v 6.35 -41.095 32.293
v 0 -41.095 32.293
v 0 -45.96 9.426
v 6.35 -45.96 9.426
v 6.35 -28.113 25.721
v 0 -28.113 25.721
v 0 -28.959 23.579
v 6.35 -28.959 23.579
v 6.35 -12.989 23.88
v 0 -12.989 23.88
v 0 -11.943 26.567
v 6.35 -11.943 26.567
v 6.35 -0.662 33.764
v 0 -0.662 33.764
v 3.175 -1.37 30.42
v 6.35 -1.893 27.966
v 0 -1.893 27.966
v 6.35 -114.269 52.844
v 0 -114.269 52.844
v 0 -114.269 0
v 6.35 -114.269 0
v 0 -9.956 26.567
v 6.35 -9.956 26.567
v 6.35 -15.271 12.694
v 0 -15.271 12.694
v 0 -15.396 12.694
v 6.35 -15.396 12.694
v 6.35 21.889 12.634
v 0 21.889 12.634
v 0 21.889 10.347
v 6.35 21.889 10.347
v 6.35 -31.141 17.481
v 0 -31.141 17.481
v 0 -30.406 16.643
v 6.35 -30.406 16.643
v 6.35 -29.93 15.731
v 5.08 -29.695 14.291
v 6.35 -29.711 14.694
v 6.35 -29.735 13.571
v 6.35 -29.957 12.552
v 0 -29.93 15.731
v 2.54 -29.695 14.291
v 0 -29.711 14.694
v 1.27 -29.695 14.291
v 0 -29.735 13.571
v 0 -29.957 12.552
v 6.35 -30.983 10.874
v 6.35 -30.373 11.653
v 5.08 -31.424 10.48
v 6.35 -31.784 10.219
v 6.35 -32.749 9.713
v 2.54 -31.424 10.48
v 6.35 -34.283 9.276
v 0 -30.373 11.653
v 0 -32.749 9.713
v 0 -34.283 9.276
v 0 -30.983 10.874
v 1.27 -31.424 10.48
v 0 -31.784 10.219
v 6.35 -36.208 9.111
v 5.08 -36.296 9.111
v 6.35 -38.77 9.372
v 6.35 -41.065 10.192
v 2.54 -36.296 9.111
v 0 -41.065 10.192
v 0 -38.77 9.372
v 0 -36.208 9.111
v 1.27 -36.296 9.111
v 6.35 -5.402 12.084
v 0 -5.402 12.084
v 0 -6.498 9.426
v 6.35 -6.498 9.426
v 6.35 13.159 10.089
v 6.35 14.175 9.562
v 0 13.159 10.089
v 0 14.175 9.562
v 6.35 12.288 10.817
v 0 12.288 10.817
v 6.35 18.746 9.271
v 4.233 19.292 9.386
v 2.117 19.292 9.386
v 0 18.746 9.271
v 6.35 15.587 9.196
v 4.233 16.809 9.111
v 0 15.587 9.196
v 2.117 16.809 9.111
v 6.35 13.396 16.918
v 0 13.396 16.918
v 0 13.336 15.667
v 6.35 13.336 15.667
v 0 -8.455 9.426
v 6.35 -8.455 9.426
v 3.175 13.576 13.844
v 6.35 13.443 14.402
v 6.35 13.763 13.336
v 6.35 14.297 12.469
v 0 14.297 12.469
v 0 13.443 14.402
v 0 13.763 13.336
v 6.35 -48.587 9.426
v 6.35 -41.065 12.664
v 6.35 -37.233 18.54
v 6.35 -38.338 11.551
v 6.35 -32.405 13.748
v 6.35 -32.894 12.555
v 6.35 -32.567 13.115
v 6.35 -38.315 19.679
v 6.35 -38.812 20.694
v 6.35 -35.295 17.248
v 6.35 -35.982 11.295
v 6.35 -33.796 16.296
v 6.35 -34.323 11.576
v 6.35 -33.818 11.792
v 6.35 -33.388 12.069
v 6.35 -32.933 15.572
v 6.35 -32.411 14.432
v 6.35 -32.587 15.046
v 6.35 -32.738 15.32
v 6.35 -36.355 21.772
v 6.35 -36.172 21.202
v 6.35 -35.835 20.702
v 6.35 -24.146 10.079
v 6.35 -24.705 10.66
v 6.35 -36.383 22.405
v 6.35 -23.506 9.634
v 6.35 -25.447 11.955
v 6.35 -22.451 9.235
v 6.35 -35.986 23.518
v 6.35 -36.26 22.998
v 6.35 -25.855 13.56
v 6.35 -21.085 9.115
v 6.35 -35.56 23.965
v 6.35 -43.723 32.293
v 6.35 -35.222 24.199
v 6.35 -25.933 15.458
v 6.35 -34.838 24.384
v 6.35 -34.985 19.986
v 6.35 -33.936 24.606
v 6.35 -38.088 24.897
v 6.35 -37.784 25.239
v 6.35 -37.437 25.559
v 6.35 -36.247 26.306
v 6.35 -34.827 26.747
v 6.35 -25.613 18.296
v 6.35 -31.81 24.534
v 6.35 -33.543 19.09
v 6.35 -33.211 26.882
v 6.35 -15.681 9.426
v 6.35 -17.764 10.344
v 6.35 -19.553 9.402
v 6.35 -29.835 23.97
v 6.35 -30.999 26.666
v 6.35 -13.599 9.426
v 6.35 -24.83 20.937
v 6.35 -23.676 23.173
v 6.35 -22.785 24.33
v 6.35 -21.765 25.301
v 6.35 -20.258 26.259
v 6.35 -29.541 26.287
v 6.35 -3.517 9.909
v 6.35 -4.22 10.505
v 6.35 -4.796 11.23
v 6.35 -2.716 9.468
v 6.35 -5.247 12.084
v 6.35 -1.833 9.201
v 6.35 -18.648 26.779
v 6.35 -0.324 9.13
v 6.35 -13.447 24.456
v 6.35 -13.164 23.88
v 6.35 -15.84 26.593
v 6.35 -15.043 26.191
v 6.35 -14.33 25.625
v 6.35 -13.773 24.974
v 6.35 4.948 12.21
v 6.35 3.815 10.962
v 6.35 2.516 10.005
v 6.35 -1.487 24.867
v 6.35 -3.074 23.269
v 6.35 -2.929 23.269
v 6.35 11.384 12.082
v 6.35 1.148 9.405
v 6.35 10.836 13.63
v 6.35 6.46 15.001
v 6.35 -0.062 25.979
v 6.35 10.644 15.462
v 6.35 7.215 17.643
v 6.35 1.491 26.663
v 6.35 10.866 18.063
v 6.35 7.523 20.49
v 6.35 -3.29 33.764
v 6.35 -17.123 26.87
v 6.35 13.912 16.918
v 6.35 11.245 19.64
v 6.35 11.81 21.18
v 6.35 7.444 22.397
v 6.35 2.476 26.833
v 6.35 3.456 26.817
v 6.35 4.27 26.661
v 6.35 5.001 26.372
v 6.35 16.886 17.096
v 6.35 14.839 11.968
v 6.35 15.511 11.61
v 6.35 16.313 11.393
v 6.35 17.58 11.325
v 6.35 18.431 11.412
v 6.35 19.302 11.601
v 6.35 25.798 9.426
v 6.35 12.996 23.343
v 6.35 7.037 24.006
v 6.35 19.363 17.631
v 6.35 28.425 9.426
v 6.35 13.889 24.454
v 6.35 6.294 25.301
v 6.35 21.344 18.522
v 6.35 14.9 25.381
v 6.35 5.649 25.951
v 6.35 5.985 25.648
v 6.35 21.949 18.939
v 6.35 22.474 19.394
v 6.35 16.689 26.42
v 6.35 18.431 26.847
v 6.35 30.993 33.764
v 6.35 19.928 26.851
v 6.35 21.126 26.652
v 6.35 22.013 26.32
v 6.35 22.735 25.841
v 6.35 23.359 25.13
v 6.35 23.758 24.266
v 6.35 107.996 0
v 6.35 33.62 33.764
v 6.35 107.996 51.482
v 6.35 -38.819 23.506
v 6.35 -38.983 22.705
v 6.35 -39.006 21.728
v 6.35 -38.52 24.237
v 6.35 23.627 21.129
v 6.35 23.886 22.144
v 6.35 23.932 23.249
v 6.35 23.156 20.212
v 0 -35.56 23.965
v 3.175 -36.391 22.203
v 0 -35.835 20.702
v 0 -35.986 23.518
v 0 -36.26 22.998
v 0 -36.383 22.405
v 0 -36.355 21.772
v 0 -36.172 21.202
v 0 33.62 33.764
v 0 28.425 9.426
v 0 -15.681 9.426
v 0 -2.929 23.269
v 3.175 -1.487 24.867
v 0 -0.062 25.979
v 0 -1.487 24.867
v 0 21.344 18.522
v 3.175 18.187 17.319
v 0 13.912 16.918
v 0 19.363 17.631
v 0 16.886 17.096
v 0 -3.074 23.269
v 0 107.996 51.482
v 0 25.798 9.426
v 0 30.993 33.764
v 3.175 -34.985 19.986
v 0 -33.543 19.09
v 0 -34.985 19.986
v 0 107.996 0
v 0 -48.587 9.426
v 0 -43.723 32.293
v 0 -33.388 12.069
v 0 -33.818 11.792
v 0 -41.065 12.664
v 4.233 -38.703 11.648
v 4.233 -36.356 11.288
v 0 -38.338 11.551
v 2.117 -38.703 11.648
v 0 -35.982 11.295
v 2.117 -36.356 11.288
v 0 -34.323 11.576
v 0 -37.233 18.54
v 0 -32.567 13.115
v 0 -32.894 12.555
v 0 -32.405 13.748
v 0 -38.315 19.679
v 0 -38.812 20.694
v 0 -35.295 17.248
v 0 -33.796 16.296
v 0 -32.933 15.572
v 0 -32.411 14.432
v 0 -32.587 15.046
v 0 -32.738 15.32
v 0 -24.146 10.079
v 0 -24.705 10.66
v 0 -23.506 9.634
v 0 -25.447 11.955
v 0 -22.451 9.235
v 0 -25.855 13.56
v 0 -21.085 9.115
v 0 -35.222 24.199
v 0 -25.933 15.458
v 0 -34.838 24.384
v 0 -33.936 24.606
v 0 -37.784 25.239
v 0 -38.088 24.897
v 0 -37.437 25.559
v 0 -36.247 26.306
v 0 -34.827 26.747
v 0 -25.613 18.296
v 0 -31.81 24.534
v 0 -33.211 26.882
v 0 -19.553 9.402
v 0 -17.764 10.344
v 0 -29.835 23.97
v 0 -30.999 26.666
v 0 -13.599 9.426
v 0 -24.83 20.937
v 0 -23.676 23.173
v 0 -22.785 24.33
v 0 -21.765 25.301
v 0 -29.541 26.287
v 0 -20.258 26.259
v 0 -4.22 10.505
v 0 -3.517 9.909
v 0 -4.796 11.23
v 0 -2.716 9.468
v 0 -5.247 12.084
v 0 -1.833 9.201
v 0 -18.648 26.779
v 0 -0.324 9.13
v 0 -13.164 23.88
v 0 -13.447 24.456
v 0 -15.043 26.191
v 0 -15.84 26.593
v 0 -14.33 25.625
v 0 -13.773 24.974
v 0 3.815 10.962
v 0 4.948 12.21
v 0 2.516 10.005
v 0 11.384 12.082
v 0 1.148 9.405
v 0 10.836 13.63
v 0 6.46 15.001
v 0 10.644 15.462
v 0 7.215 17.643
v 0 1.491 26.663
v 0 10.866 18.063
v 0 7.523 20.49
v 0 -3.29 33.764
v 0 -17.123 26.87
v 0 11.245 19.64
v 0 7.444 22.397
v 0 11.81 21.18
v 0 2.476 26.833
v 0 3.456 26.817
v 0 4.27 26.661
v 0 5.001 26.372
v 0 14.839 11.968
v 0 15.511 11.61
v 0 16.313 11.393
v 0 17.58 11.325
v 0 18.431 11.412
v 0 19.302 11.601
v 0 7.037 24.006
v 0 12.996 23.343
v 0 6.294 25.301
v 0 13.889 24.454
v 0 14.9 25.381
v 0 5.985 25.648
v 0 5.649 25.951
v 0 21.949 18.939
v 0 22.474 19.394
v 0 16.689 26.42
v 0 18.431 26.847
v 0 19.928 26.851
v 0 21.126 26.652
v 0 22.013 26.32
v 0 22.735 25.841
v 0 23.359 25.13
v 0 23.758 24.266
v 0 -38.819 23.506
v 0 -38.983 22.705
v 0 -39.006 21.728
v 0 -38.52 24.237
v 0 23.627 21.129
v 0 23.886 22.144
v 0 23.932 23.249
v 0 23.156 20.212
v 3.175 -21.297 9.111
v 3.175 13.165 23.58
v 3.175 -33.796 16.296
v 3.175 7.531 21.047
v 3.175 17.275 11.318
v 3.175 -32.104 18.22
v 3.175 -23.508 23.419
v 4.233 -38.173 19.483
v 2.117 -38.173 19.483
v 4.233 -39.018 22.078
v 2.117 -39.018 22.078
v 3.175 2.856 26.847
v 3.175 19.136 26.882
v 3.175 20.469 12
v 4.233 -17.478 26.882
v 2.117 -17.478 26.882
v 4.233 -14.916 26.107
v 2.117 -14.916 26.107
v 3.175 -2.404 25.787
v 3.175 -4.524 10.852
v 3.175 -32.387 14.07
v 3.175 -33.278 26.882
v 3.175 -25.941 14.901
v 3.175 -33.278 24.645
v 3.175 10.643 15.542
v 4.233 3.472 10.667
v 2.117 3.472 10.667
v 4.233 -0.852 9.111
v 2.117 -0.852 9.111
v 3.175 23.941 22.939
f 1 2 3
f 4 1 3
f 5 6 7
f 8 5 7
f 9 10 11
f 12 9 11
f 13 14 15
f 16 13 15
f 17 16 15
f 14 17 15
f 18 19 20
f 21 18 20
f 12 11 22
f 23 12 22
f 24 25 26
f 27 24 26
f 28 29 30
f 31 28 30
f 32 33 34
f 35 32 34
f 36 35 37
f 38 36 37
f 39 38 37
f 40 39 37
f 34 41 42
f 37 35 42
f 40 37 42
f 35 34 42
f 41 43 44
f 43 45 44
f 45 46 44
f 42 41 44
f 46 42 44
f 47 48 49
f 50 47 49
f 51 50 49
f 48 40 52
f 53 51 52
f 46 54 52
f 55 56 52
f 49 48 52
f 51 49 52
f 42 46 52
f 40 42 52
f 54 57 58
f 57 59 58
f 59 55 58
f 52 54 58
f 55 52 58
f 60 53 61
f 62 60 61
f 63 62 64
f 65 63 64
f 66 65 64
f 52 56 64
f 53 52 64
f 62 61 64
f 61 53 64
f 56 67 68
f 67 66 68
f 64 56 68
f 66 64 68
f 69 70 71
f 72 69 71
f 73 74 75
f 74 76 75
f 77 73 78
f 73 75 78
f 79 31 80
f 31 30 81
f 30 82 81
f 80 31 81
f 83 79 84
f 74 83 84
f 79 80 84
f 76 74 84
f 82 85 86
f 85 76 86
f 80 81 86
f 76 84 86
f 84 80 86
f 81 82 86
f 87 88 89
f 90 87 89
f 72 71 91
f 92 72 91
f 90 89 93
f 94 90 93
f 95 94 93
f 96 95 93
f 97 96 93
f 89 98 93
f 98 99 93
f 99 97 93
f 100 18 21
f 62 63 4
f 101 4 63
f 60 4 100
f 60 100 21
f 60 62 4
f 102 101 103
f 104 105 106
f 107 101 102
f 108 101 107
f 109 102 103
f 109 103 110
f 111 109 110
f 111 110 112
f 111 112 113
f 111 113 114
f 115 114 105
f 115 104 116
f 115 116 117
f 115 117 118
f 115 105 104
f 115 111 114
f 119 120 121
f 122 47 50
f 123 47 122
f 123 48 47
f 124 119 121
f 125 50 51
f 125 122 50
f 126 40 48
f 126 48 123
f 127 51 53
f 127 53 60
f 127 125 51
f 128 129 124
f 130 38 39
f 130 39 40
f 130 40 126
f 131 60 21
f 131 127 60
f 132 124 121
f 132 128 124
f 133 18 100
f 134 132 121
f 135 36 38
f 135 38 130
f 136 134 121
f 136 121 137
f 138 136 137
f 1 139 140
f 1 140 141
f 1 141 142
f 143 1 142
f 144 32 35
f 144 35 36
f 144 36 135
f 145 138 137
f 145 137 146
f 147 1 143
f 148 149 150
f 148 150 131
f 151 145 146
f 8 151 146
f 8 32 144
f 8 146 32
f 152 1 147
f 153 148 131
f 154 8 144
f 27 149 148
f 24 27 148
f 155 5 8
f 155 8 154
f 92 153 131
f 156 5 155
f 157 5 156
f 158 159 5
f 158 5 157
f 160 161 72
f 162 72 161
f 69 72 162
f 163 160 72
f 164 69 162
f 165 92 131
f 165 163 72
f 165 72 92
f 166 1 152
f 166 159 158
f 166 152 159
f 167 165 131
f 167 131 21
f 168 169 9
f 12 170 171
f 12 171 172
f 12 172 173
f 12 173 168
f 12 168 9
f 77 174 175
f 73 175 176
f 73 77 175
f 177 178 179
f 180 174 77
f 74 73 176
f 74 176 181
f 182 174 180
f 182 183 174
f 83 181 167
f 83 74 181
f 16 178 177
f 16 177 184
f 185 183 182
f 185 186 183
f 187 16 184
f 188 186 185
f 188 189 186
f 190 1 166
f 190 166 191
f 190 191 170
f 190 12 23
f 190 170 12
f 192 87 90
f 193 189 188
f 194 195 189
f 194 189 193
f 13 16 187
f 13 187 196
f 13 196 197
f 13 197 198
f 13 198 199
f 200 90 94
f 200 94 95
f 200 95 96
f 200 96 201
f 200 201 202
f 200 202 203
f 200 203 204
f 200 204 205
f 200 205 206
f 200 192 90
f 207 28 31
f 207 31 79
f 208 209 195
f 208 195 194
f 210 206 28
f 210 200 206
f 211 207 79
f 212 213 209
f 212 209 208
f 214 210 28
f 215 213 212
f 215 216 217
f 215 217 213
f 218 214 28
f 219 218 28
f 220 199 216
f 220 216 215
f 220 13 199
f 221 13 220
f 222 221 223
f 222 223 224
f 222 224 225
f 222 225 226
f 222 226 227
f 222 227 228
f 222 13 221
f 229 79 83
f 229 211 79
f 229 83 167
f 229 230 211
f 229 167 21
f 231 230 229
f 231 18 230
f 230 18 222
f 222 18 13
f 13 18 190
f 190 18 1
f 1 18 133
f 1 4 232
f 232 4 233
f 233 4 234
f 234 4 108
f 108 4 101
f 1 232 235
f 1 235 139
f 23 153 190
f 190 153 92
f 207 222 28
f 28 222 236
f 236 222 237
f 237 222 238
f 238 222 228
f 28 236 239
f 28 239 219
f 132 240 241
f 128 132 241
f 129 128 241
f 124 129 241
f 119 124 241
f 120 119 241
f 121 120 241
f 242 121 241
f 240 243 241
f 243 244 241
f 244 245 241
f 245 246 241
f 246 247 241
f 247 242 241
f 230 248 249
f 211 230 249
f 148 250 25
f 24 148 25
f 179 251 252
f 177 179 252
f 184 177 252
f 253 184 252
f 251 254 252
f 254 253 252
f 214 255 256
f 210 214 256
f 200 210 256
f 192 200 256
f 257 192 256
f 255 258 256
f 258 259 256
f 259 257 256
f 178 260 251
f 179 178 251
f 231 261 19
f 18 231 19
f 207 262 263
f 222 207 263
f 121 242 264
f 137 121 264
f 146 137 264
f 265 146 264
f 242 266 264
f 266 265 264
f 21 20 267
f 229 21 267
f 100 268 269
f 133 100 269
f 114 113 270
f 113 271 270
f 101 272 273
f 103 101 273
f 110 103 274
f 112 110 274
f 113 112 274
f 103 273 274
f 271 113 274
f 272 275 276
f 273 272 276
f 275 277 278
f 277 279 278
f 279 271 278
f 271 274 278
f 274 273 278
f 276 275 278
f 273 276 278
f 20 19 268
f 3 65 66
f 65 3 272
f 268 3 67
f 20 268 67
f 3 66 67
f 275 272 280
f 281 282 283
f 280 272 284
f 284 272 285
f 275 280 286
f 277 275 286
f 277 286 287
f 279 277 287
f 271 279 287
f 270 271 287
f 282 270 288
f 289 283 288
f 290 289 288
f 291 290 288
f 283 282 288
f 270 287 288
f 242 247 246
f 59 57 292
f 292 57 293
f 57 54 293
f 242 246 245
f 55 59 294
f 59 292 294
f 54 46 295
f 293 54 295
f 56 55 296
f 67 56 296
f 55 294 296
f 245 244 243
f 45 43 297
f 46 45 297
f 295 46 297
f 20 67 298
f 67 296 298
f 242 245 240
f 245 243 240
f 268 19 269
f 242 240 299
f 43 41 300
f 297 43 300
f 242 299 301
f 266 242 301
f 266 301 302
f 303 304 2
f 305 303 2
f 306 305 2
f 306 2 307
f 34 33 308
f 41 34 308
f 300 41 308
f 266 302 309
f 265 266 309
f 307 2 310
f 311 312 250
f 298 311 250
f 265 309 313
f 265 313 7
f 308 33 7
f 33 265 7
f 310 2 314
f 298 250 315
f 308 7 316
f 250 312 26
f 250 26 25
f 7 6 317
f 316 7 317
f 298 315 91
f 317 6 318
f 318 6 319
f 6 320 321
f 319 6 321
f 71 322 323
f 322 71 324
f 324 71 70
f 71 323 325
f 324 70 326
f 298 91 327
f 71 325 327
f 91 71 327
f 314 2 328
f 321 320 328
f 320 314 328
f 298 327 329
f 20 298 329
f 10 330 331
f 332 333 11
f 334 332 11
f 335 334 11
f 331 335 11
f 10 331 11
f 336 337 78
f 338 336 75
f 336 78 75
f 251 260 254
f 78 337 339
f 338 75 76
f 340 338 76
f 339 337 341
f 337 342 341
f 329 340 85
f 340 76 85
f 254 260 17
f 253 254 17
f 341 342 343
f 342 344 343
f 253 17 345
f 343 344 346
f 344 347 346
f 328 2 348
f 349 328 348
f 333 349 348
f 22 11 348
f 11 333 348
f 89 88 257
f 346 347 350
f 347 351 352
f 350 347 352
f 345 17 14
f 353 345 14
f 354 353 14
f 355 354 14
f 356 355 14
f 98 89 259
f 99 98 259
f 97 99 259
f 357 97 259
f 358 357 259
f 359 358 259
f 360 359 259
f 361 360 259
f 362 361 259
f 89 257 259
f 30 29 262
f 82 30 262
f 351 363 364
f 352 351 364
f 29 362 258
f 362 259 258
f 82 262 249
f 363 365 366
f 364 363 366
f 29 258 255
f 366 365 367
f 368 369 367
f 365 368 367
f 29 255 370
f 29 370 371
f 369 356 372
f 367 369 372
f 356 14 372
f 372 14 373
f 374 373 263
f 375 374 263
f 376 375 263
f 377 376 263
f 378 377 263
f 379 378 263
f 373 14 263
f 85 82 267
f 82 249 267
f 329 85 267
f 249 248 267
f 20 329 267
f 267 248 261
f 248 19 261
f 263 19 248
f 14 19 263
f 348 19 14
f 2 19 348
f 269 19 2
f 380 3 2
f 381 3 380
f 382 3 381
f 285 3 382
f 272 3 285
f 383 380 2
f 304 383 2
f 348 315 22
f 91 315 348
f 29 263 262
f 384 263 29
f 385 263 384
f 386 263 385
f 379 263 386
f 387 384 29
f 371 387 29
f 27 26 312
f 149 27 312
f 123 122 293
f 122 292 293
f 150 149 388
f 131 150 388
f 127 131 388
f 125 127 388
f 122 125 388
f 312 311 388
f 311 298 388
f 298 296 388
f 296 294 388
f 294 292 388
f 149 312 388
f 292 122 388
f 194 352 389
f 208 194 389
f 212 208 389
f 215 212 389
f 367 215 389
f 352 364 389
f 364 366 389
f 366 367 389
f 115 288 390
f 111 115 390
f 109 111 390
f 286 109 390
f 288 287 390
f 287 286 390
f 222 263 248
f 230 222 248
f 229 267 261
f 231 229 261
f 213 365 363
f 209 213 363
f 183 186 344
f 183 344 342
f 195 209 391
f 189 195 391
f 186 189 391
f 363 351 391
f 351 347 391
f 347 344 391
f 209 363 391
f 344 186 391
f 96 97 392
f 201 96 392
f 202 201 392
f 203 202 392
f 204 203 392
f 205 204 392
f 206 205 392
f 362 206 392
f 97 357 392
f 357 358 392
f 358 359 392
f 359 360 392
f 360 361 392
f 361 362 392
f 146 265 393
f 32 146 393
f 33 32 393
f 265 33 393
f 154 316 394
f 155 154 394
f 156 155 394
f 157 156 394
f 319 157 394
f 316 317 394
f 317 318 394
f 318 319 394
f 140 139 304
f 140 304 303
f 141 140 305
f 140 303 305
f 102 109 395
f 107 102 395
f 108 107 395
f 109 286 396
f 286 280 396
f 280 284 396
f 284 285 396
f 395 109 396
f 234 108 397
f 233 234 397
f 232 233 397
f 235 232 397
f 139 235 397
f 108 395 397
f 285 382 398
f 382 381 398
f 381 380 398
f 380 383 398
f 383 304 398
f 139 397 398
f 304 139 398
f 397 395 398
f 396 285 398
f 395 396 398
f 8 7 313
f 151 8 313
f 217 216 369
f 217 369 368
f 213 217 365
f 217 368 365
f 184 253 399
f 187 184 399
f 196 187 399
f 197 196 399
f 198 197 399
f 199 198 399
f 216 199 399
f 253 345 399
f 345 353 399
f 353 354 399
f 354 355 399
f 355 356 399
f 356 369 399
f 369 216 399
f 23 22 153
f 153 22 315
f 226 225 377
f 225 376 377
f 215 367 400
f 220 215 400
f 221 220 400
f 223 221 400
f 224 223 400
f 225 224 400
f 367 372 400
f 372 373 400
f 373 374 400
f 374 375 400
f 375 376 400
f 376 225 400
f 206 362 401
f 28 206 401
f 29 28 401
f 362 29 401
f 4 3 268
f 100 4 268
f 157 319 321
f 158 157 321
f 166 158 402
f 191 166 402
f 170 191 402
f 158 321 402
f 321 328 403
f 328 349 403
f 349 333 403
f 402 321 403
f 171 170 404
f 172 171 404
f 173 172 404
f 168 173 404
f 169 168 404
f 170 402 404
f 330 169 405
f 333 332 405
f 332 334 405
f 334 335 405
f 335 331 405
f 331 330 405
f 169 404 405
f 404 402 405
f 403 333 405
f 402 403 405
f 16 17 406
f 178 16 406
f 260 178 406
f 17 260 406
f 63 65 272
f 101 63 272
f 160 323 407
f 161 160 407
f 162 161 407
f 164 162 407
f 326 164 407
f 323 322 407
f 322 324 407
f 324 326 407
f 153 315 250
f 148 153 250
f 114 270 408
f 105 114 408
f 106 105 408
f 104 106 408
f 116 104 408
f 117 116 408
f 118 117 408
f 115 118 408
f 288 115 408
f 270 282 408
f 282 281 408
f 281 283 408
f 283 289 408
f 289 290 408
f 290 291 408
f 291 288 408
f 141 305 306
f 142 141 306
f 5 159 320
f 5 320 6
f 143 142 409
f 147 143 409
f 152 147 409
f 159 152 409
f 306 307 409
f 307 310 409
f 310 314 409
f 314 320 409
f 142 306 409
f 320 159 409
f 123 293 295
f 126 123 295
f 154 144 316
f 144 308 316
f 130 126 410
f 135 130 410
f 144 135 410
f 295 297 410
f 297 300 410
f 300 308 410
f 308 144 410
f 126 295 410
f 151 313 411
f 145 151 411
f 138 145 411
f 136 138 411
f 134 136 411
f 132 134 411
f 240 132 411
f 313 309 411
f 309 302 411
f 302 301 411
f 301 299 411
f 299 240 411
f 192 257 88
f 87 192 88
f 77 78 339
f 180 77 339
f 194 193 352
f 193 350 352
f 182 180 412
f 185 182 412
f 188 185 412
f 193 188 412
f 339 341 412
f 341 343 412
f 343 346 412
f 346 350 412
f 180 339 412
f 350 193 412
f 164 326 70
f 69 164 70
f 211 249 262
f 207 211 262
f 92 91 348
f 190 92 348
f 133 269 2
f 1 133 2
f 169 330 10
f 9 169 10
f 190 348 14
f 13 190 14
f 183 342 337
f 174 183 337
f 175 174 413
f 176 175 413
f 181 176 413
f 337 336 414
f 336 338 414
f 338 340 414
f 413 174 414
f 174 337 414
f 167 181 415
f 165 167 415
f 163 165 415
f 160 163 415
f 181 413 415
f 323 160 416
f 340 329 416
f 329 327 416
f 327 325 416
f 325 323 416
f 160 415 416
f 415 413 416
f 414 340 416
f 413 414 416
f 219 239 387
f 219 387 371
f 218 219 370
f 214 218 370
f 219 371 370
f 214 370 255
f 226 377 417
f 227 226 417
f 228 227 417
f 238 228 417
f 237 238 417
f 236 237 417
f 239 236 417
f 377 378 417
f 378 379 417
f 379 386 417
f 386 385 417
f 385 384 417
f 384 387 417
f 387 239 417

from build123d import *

# Parameters (mm, degrees)
F1_DEPTH = 6.35


with BuildPart() as f1:
    # F0 (on Right) → F1 (new body)
    with BuildSketch(Plane.YZ):
        Polygon((107.9963296652, 51.4815896749), (-114.268861711, 52.8442300856), (-114.268861711, 0), (107.9963296652, 0), align=None)
        with BuildLine():
            add(Edge.make_bspline(
                [(-30.0548927116, 16.0347425229), (-29.694553079, 15.2615137279), (-29.694553079, 14.2905986067)],
                knots=[0, 0, 0, 1, 1, 1], degree=2))
            add(Edge.make_bspline(
                [(-29.694553079, 14.2905986067), (-29.694553079, 11.8482966524), (-31.4236828438, 10.4795065202)],
                knots=[0, 0, 0, 1, 1, 1], degree=2))
            add(Edge.make_bspline(
                [(-31.4236828438, 10.4795065202), (-33.1528126086, 9.110716388), (-36.2957749597, 9.110716388)],
                knots=[0, 0, 0, 1, 1, 1], degree=2))
            add(Edge.make_bspline(
                [(-36.2957749597, 9.110716388), (-38.9382655988, 9.110716388), (-41.0652703746, 10.1917352858)],
                knots=[0, 0, 0, 1, 1, 1], degree=2))
            Line((-41.0652703746, 10.1917352858), (-41.0652703746, 12.6640655429))
            add(Edge.make_bspline(
                [(-41.0652703746, 12.6640655429), (-39.9692373254, 12.0084476002), (-38.7030438942, 11.6481079676)],
                knots=[0, 0, 0, 1, 1, 1], degree=2))
            add(Edge.make_bspline(
                [(-38.7030438942, 11.6481079676), (-37.436850463, 11.287768335), (-36.3558315651, 11.287768335)],
                knots=[0, 0, 0, 1, 1, 1], degree=2))
            add(Edge.make_bspline(
                [(-36.3558315651, 11.287768335), (-34.3889777372, 11.287768335), (-33.3880343132, 12.0685042057)],
                knots=[0, 0, 0, 1, 1, 1], degree=2))
            add(Edge.make_bspline(
                [(-33.3880343132, 12.0685042057), (-32.3870908893, 12.8492400763), (-32.3870908893, 14.0703910535)],
                knots=[0, 0, 0, 1, 1, 1], degree=2))
            add(Edge.make_bspline(
                [(-32.3870908893, 14.0703910535), (-32.3870908893, 14.9612307008), (-32.9326050554, 15.5718061894)],
                knots=[0, 0, 0, 1, 1, 1], degree=2))
            add(Edge.make_bspline(
                [(-32.9326050554, 15.5718061894), (-33.4781192214, 16.1823816779), (-35.2948315358, 17.2483864244)],
                knots=[0, 0, 0, 1, 1, 1], degree=2))
            add(Edge.make_bspline(
                [(-35.2948315358, 17.2483864244), (-37.3267466863, 18.3894619277), (-38.1725438795, 19.4829926183)],
                knots=[0, 0, 0, 1, 1, 1], degree=2))
            add(Edge.make_bspline(
                [(-38.1725438795, 19.4829926183), (-39.0183410727, 20.5765233089), (-39.0183410727, 22.0779384448)],
                knots=[0, 0, 0, 1, 1, 1], degree=2))
            add(Edge.make_bspline(
                [(-39.0183410727, 22.0779384448), (-39.0183410727, 24.2349715233), (-37.436850463, 25.5587192014)],
                knots=[0, 0, 0, 1, 1, 1], degree=2))
            add(Edge.make_bspline(
                [(-37.436850463, 25.5587192014), (-35.8553598532, 26.8824668795), (-33.2779305366, 26.8824668795)],
                knots=[0, 0, 0, 1, 1, 1], degree=2))
            add(Edge.make_bspline(
                [(-33.2779305366, 26.8824668795), (-30.6004068777, 26.8824668795), (-28.1130624692, 25.7213725078)],
                knots=[0, 0, 0, 1, 1, 1], degree=2))
            Line((-28.1130624692, 25.7213725078), (-28.9588596625, 23.5793535806))
            Line((-28.9588596625, 23.5793535806), (-29.8346851584, 23.9697215159))
            add(Edge.make_bspline(
                [(-29.8346851584, 23.9697215159), (-31.4161757681, 24.6453583271), (-33.2779305366, 24.6453583271)],
                knots=[0, 0, 0, 1, 1, 1], degree=2))
            add(Edge.make_bspline(
                [(-33.2779305366, 24.6453583271), (-34.7292985013, 24.6453583271), (-35.5600815431, 23.9647167988)],
                knots=[0, 0, 0, 1, 1, 1], degree=2))
            add(Edge.make_bspline(
                [(-35.5600815431, 23.9647167988), (-36.390864585, 23.2840752706), (-36.390864585, 22.2030563727)],
                knots=[0, 0, 0, 1, 1, 1], degree=2))
            add(Edge.make_bspline(
                [(-36.390864585, 22.2030563727), (-36.390864585, 21.3272308768), (-35.8353409847, 20.7016412369)],
                knots=[0, 0, 0, 1, 1, 1], degree=2))
            add(Edge.make_bspline(
                [(-35.8353409847, 20.7016412369), (-35.2798173844, 20.0760515969), (-33.543180544, 19.0901223244)],
                knots=[0, 0, 0, 1, 1, 1], degree=2))
            add(Edge.make_bspline(
                [(-33.543180544, 19.0901223244), (-31.8666003089, 18.154240223), (-31.1409163266, 17.4811057705)],
                knots=[0, 0, 0, 1, 1, 1], degree=2))
            add(Edge.make_bspline(
                [(-31.1409163266, 17.4811057705), (-30.4152323442, 16.8079713179), (-30.0548927116, 16.0347425229)],
                knots=[0, 0, 0, 1, 1, 1], degree=2))
        make_face(mode=Mode.SUBTRACT)
        with BuildLine():
            add(Edge.make_bspline(
                [(-21.7645788031, 25.3009762697), (-19.8102367679, 26.8824668795), (-17.4780385902, 26.8824668795)],
                knots=[0, 0, 0, 1, 1, 1], degree=2))
            add(Edge.make_bspline(
                [(-17.4780385902, 26.8824668795), (-16.0416847769, 26.8824668795), (-14.915623425, 26.106735726)],
                knots=[0, 0, 0, 1, 1, 1], degree=2))
            add(Edge.make_bspline(
                [(-14.915623425, 26.106735726), (-13.7895620731, 25.3310045725), (-13.1639724332, 23.8796366078)],
                knots=[0, 0, 0, 1, 1, 1], degree=2))
            Line((-13.1639724332, 23.8796366078), (-12.988807334, 23.8796366078))
            Line((-12.988807334, 23.8796366078), (-11.942821456, 26.567169701))
            Line((-11.942821456, 26.567169701), (-9.9559487595, 26.567169701))
            Line((-9.9559487595, 26.567169701), (-13.5993828226, 9.4260135666))
            Line((-13.5993828226, 9.4260135666), (-15.6813451443, 9.4260135666))
            Line((-15.6813451443, 9.4260135666), (-15.2709583405, 12.6940938456))
            Line((-15.2709583405, 12.6940938456), (-15.3960762685, 12.6940938456))
            add(Edge.make_bspline(
                [(-15.3960762685, 12.6940938456), (-18.1987178554, 9.110716388), (-21.2966377524, 9.110716388)],
                knots=[0, 0, 0, 1, 1, 1], degree=2))
            add(Edge.make_bspline(
                [(-21.2966377524, 9.110716388), (-23.4686849823, 9.110716388), (-24.7048501108, 10.6596763365)],
                knots=[0, 0, 0, 1, 1, 1], degree=2))
            add(Edge.make_bspline(
                [(-24.7048501108, 10.6596763365), (-25.9410152394, 12.208636285), (-25.9410152394, 14.9011740953)],
                knots=[0, 0, 0, 1, 1, 1], degree=2))
            add(Edge.make_bspline(
                [(-25.9410152394, 14.9011740953), (-25.9410152394, 18.154240223), (-24.8299680388, 20.9368629415)],
                knots=[0, 0, 0, 1, 1, 1], degree=2))
            add(Edge.make_bspline(
                [(-24.8299680388, 20.9368629415), (-23.7189208383, 23.71948566), (-21.7645788031, 25.3009762697)],
                knots=[0, 0, 0, 1, 1, 1], degree=2))
        make_face(mode=Mode.SUBTRACT)
        Polygon((-45.9598837175, 9.4260135666), (-48.5873602053, 9.4260135666), (-43.7227751651, 32.2925660857), (-41.0952986773, 32.2925660857), align=None, mode=Mode.SUBTRACT)
        with BuildLine():
            add(Edge.make_bspline(
                [(19.2916180871, 9.3859758296), (18.1655567352, 9.110716388), (16.8092783958, 9.110716388)],
                knots=[0, 0, 0, 1, 1, 1], degree=2))
            add(Edge.make_bspline(
                [(16.8092783958, 9.110716388), (13.931566052, 9.110716388), (12.2875164783, 10.8173249258)],
                knots=[0, 0, 0, 1, 1, 1], degree=2))
            add(Edge.make_bspline(
                [(12.2875164783, 10.8173249258), (10.6434669045, 12.5239334636), (10.6434669045, 15.5417778866)],
                knots=[0, 0, 0, 1, 1, 1], degree=2))
            add(Edge.make_bspline(
                [(10.6434669045, 15.5417778866), (10.6434669045, 18.4795468358), (11.8095659933, 21.1795917218)],
                knots=[0, 0, 0, 1, 1, 1], degree=2))
            add(Edge.make_bspline(
                [(11.8095659933, 21.1795917218), (12.9756650822, 23.8796366078), (14.8999788147, 25.3810517437)],
                knots=[0, 0, 0, 1, 1, 1], degree=2))
            add(Edge.make_bspline(
                [(14.8999788147, 25.3810517437), (16.8242925471, 26.8824668795), (19.1364718564, 26.8824668795)],
                knots=[0, 0, 0, 1, 1, 1], degree=2))
            add(Edge.make_bspline(
                [(19.1364718564, 26.8824668795), (21.5287266395, 26.8824668795), (22.7348634653, 25.8414857187)],
                knots=[0, 0, 0, 1, 1, 1], degree=2))
            add(Edge.make_bspline(
                [(22.7348634653, 25.8414857187), (23.9410002911, 24.8005045578), (23.9410002911, 22.9387497893)],
                knots=[0, 0, 0, 1, 1, 1], degree=2))
            add(Edge.make_bspline(
                [(23.9410002911, 22.9387497893), (23.9410002911, 20.1260987681), (21.3435521061, 18.5220869313)],
                knots=[0, 0, 0, 1, 1, 1], degree=2))
            add(Edge.make_bspline(
                [(21.3435521061, 18.5220869313), (18.746103921, 16.9180750945), (13.9115471835, 16.9180750945)],
                knots=[0, 0, 0, 1, 1, 1], degree=2))
            Line((13.9115471835, 16.9180750945), (13.3960613202, 16.9180750945))
            Line((13.3960613202, 16.9180750945), (13.3360047148, 15.6668958146))
            add(Edge.make_bspline(
                [(13.3360047148, 15.6668958146), (13.3360047148, 13.6199665127), (14.2969104018, 12.4688815752)],
                knots=[0, 0, 0, 1, 1, 1], degree=2))
            add(Edge.make_bspline(
                [(14.2969104018, 12.4688815752), (15.2578160887, 11.3177966377), (17.2747170879, 11.3177966377)],
                knots=[0, 0, 0, 1, 1, 1], degree=2))
            add(Edge.make_bspline(
                [(17.2747170879, 11.3177966377), (18.2606463604, 11.3177966377), (19.3016275213, 11.600563155)],
                knots=[0, 0, 0, 1, 1, 1], degree=2))
            add(Edge.make_bspline(
                [(19.3016275213, 11.600563155), (20.3426086822, 11.8833296722), (21.8890662721, 12.6340372402)],
                knots=[0, 0, 0, 1, 1, 1], degree=2))
            Line((21.8890662721, 12.6340372402), (21.8890662721, 10.3468815165))
            add(Edge.make_bspline(
                [(21.8890662721, 10.3468815165), (20.417679439, 9.6612352712), (19.2916180871, 9.3859758296)],
                knots=[0, 0, 0, 1, 1, 1], degree=2))
        make_face(mode=Mode.SUBTRACT)
        with BuildLine():
            add(Edge.make_bspline(
                [(3.4717072722, 10.6671834122), (1.5549006154, 9.110716388), (-0.8523683191, 9.110716388)],
                knots=[0, 0, 0, 1, 1, 1], degree=2))
            add(Edge.make_bspline(
                [(-0.8523683191, 9.110716388), (-2.3687976063, 9.110716388), (-3.5173801853, 9.9089687686)],
                knots=[0, 0, 0, 1, 1, 1], degree=2))
            add(Edge.make_bspline(
                [(-3.5173801853, 9.9089687686), (-4.6659627642, 10.7072211492), (-5.2465099501, 12.083518357)],
                knots=[0, 0, 0, 1, 1, 1], degree=2))
            Line((-5.2465099501, 12.083518357), (-5.4016561808, 12.083518357))
            Line((-5.4016561808, 12.083518357), (-6.4976892299, 9.4260135666))
            Line((-6.4976892299, 9.4260135666), (-8.4545336237, 9.4260135666))
            Line((-8.4545336237, 9.4260135666), (-3.2896655563, 33.7639529189))
            Line((-3.2896655563, 33.7639529189), (-0.6621890686, 33.7639529189))
            add(Edge.make_bspline(
                [(-0.6621890686, 33.7639529189), (-1.4629438077, 29.9753820594), (-1.89334948, 27.9659881359)],
                knots=[0, 0, 0, 1, 1, 1], degree=2))
            add(Edge.make_bspline(
                [(-1.89334948, 27.9659881359), (-2.3237551522, 25.9565942124), (-3.0744627202, 23.2690611192)],
                knots=[0, 0, 0, 1, 1, 1], degree=2))
            Line((-3.0744627202, 23.2690611192), (-2.9293259237, 23.2690611192))
            add(Edge.make_bspline(
                [(-2.9293259237, 23.2690611192), (-1.477957959, 25.1107970192), (-0.0616230142, 25.9791154394)],
                knots=[0, 0, 0, 1, 1, 1], degree=2))
            add(Edge.make_bspline(
                [(-0.0616230142, 25.9791154394), (1.3547119306, 26.8474338597), (2.8561270665, 26.8474338597)],
                knots=[0, 0, 0, 1, 1, 1], degree=2))
            add(Edge.make_bspline(
                [(2.8561270665, 26.8474338597), (5.0582025991, 26.8474338597), (6.2943677276, 25.3009762697)],
                knots=[0, 0, 0, 1, 1, 1], degree=2))
            add(Edge.make_bspline(
                [(6.2943677276, 25.3009762697), (7.5305328561, 23.7545186798), (7.5305328561, 21.0469667181)],
                knots=[0, 0, 0, 1, 1, 1], degree=2))
            add(Edge.make_bspline(
                [(7.5305328561, 21.0469667181), (7.5305328561, 17.7788864391), (6.4595233926, 15.0012684377)],
                knots=[0, 0, 0, 1, 1, 1], degree=2))
            add(Edge.make_bspline(
                [(6.4595233926, 15.0012684377), (5.388513929, 12.2236504364), (3.4717072722, 10.6671834122)],
                knots=[0, 0, 0, 1, 1, 1], degree=2))
        make_face(mode=Mode.SUBTRACT)
        Polygon((33.6201232003, 33.7639529189), (28.4252268302, 9.4260135666), (25.7977503425, 9.4260135666), (30.9926467125, 33.7639529189), align=None, mode=Mode.SUBTRACT)
    extrude(amount=F1_DEPTH)


solid = f1.part
